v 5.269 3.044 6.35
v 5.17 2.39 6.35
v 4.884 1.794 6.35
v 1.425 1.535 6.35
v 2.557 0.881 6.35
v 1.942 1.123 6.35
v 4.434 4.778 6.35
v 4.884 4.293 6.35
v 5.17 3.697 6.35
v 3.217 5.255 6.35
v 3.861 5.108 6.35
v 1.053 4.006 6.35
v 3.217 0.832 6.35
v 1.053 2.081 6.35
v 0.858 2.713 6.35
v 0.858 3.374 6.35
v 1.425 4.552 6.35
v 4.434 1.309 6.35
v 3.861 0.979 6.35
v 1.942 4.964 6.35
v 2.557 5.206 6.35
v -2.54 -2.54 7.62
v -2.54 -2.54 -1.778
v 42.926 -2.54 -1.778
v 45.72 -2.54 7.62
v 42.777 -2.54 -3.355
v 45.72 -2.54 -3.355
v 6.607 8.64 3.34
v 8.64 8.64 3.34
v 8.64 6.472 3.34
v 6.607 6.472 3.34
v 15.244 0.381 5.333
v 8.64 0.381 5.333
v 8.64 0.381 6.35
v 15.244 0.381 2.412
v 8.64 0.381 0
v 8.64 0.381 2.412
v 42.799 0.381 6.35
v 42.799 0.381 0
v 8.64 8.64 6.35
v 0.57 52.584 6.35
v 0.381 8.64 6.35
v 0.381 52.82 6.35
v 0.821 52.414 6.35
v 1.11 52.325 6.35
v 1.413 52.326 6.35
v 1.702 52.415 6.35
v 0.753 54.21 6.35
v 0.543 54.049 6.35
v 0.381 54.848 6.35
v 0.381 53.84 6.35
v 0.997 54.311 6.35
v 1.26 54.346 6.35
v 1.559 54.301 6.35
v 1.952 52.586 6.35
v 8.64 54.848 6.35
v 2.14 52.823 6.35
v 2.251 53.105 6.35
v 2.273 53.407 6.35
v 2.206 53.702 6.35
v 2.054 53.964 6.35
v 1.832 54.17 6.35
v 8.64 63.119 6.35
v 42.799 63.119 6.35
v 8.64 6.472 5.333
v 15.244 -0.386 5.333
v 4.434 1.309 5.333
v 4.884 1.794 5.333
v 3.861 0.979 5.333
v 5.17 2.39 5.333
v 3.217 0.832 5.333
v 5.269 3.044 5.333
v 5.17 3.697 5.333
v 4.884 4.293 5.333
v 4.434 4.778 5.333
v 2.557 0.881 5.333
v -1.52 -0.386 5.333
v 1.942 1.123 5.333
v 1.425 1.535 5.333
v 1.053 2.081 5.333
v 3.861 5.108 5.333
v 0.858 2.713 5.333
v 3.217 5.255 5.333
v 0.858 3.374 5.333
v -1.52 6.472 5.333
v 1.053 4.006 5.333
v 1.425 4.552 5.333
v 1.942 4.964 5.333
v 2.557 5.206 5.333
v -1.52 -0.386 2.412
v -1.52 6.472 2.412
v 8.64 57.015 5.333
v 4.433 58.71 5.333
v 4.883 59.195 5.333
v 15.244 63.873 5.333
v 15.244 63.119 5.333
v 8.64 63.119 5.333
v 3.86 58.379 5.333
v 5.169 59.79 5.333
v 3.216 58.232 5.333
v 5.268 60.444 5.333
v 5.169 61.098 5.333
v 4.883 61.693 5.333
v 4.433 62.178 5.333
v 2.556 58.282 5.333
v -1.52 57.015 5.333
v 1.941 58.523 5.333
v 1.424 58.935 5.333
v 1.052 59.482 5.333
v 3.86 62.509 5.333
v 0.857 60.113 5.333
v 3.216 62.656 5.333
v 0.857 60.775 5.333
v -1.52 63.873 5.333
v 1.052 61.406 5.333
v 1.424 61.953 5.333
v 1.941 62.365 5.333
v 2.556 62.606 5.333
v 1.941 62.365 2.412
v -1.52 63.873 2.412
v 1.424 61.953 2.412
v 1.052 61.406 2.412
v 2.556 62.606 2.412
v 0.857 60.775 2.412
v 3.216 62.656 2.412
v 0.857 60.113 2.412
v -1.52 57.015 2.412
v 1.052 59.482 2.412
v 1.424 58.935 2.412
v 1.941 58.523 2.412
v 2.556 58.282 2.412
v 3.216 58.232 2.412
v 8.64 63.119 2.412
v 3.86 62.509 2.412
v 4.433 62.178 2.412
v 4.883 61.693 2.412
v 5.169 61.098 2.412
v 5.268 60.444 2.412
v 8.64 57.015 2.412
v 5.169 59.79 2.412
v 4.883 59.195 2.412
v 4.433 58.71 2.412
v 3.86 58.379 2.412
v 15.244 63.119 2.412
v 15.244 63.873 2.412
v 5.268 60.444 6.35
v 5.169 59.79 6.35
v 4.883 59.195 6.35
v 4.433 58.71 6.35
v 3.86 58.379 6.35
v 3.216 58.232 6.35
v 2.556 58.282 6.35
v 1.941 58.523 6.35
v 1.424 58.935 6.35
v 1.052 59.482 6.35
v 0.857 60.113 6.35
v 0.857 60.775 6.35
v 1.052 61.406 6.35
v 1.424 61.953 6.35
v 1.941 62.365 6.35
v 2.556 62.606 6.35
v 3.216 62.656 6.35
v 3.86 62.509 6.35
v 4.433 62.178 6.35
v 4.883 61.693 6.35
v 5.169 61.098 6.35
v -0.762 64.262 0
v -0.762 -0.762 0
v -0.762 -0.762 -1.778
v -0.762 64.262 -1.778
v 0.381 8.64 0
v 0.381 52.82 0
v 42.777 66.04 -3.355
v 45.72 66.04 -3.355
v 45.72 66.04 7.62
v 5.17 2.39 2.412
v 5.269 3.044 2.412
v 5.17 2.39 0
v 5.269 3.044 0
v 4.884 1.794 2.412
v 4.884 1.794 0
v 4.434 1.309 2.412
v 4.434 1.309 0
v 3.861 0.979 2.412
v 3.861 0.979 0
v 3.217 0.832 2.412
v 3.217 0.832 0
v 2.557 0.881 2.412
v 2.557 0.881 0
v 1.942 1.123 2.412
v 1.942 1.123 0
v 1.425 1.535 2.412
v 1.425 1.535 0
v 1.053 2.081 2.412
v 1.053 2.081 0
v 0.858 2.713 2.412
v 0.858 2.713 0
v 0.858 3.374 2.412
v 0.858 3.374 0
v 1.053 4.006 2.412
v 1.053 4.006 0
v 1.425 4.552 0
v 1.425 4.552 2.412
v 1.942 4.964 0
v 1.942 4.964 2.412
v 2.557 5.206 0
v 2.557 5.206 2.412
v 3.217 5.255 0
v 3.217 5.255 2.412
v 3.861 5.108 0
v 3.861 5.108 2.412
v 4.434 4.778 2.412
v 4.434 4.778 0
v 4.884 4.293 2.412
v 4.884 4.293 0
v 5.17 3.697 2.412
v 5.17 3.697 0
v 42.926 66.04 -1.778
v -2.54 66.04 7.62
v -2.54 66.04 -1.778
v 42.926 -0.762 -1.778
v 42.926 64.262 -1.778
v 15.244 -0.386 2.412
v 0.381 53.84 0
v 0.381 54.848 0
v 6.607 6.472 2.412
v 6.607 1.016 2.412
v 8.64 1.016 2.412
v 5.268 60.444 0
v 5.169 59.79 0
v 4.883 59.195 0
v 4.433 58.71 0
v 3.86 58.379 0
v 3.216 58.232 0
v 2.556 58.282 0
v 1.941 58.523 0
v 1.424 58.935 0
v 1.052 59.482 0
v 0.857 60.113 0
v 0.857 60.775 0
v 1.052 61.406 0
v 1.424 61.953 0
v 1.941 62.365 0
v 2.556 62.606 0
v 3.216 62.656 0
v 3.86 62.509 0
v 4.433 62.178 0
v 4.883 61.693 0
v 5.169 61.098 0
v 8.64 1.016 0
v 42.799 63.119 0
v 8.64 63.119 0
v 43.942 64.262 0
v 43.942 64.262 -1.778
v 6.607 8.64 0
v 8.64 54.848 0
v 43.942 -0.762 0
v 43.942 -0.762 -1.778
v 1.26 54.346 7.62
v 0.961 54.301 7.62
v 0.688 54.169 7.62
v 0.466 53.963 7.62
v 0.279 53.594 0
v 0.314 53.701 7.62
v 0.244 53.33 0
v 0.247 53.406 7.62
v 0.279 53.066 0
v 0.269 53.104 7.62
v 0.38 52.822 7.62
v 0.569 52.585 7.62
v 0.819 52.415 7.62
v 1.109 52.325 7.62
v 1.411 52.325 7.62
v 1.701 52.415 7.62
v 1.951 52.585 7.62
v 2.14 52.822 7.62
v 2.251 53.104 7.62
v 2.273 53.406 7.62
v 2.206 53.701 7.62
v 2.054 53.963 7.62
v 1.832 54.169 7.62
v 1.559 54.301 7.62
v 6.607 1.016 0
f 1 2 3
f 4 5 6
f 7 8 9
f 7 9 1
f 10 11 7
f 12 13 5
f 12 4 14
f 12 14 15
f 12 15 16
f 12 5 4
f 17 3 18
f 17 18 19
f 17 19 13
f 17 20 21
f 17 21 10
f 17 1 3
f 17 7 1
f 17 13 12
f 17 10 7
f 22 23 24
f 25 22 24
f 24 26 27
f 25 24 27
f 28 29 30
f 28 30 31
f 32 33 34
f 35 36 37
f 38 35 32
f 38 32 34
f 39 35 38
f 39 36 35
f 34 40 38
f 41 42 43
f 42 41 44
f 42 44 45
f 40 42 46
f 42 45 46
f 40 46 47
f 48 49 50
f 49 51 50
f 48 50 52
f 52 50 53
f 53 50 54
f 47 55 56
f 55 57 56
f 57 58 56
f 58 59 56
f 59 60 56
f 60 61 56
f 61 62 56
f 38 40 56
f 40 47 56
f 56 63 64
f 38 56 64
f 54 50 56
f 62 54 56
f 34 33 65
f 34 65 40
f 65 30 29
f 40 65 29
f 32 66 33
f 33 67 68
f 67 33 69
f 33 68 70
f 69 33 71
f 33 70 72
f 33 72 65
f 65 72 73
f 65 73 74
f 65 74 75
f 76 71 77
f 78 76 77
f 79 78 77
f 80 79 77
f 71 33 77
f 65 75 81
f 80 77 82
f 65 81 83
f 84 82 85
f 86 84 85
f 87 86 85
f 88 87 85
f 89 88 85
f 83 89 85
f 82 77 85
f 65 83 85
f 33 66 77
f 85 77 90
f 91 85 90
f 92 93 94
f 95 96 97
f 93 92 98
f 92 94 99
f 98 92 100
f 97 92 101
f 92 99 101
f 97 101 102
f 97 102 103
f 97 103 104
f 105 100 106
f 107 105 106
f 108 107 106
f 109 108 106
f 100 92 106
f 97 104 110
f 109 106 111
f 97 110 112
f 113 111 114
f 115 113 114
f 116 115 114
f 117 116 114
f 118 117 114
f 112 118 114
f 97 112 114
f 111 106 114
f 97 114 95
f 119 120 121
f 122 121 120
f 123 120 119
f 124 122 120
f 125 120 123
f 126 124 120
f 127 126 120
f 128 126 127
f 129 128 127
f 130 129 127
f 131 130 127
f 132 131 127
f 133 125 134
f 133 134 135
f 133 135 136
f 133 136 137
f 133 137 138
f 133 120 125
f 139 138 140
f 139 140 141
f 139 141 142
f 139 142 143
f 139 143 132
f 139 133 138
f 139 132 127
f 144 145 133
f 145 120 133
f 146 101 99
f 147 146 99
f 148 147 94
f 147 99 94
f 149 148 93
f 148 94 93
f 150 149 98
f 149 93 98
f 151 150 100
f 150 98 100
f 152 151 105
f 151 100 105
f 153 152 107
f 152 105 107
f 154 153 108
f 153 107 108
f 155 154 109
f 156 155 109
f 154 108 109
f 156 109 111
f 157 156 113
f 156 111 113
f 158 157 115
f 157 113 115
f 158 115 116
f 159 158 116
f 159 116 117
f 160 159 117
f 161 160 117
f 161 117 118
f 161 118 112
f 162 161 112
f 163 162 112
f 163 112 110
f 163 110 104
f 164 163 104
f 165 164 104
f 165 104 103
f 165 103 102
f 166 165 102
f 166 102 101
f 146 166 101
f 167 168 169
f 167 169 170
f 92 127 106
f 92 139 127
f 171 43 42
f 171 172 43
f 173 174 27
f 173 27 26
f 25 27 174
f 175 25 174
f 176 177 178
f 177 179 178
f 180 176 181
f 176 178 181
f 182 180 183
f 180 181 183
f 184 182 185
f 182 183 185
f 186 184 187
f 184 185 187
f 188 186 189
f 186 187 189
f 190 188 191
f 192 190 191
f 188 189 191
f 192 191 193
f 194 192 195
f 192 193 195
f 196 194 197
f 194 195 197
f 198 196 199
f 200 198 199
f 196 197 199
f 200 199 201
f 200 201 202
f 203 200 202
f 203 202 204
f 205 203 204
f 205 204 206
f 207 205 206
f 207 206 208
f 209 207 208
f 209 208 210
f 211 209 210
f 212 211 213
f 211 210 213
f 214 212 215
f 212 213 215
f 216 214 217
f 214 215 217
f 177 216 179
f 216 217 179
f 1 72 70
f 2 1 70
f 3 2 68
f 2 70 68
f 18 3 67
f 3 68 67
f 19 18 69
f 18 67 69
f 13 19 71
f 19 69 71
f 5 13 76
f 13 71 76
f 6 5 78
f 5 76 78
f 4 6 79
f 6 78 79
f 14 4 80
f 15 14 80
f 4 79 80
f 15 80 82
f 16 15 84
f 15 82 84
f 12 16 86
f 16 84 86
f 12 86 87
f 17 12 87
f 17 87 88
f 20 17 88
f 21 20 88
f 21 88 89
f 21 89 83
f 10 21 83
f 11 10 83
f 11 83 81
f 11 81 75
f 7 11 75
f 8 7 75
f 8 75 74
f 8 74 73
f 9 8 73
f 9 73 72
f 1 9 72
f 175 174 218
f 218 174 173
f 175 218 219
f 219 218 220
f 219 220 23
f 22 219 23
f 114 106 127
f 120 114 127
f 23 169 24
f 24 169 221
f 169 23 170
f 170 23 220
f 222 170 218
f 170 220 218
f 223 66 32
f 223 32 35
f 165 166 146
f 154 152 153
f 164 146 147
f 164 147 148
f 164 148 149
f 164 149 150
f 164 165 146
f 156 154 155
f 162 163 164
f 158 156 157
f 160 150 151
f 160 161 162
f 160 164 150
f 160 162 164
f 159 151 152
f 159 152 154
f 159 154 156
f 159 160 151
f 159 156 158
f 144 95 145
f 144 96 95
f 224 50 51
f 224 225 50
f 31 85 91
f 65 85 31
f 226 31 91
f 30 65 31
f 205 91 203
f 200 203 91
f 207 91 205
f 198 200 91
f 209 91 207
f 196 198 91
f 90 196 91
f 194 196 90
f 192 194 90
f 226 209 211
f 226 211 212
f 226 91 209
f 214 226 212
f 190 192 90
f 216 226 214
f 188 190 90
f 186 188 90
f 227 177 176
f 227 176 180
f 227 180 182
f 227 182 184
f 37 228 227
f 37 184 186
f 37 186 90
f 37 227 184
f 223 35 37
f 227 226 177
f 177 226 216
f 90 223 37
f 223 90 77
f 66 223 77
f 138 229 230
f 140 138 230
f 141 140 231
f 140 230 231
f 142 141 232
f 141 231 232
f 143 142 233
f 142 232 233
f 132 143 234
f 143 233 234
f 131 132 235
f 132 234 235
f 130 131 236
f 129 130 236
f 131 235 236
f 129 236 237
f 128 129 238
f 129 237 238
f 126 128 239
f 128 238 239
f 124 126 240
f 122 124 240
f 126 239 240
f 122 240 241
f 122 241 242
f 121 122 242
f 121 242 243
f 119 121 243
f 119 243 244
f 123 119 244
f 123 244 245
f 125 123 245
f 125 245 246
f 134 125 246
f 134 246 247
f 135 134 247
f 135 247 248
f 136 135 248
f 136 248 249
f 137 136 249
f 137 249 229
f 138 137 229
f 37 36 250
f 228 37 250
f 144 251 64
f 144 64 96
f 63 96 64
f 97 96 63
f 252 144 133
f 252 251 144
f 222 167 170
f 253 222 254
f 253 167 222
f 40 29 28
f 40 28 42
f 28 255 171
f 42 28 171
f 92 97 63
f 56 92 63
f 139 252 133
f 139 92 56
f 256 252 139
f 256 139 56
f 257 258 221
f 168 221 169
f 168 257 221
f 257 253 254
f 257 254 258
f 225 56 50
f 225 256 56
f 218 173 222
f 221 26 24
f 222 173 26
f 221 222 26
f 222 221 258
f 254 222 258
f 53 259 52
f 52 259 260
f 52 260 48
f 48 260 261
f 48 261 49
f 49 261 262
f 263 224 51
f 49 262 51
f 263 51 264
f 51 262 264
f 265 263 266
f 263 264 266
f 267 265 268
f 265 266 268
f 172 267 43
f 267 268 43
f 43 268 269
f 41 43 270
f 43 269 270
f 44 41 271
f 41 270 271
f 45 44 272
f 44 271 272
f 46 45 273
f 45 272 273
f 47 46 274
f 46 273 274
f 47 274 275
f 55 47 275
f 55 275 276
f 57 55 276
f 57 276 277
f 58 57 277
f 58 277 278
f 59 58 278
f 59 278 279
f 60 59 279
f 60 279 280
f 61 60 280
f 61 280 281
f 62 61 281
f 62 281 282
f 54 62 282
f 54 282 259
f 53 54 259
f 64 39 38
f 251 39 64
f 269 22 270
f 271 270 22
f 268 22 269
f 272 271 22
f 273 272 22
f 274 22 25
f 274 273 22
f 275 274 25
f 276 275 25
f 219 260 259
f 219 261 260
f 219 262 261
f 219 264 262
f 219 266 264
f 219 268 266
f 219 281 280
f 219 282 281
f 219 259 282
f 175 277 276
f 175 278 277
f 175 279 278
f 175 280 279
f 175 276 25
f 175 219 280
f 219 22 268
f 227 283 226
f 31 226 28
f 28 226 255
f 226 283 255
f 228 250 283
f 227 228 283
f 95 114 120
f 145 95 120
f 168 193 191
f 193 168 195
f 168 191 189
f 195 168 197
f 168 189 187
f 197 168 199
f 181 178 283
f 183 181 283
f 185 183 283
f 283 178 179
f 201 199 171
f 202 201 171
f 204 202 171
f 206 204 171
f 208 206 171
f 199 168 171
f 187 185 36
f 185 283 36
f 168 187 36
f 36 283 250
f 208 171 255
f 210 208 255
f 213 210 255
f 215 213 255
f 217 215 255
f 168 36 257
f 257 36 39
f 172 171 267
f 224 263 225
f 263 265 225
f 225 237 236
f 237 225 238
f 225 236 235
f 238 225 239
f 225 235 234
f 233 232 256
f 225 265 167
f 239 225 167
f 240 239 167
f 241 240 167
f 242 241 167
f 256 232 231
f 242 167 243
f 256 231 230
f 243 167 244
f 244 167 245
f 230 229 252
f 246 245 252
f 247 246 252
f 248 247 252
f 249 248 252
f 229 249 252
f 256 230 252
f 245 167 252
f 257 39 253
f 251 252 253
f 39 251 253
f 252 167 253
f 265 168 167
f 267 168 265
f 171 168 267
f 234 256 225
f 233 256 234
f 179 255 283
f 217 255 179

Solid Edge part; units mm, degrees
sketch "Sketch1" plane through (0, 0, 0) normal (0, 0, 1) x (1, 0, 0)
  line L0 (45.72, -2.54) -> (45.72, 66.04)
  line L1 (45.72, 66.04) -> (-2.54, 66.04)
  line L2 (-2.54, 66.04) -> (-2.54, -2.54)
  line L3 (-2.54, -2.54) -> (45.72, -2.54)
  line L4 (42.799, 0.381) -> (42.799, 63.119)
  line L5 (42.799, 63.119) -> (0.381, 63.119)
  line L6 (0.381, 63.119) -> (0.381, 0.381)
  line L7 (0.381, 0.381) -> (42.799, 0.381)
  dimension "D1" = 2.54
  dimension "D2" = 0.381
extrude "Protrusion1" add sketch "Sketch1" along normal blind 6.35
sketch "Sketch2" plane through (21.59, 31.75, 0) normal (0, 0, -1) x (0, 1, 0)
  line L0 (32.512, -22.352) -> (32.512, 22.352)
  line L1 (32.512, 22.352) -> (-32.512, 22.352)
  line L2 (-32.512, 22.352) -> (-32.512, -22.352)
  line L3 (-32.512, -22.352) -> (32.512, -22.352)
  line L4 (34.29, 24.13) -> (34.29, -24.13)
  line L5 (34.29, -24.13) -> (-34.29, -24.13)
  line L6 (-34.29, -24.13) -> (-34.29, 24.13)
  line L7 (-34.29, 24.13) -> (34.29, 24.13)
  dimension "D1" = 0.762
extrude "Protrusion2" add sketch "Sketch2" along normal up to vertex (1.778 mm away)
sketch "Sketch3" plane through (21.59, -2.54, 2.286) normal (0, -1, 0) x (-1, 0, 0)
  line L0 (-24.13, 5.6414) -> (-21.187, 5.6414)
  line L1 (-21.187, 5.6414) -> (-21.336, 4.064)
  line L2 (-21.336, 4.064) -> (-24.13, 4.064)
  line L3 (-24.13, 4.064) -> (-24.13, 5.6414)
extrude "Protrusion3" add sketch "Sketch3" against normal up to vertex (68.58 mm away)
sketch "Sketch4" plane through (21.59, 31.75, 6.35) normal (0, 0, 1) x (0, -1, 0)
  line L0 (34.29, 24.13) -> (-34.29, 24.13)
  line L1 (-34.29, 24.13) -> (-34.29, -24.13)
  line L2 (-34.29, -24.13) -> (34.29, -24.13)
  line L3 (34.29, -24.13) -> (34.29, 24.13)
extrude "ExtrudedProtrusion_4" add sketch "Sketch4" along normal blind 1.27
sketch "Sketch5" plane through (21.59, 31.75, 0) normal (0, 0, -1) x (-1, 0, 0)
  line L0 (12.95, -23.11) -> (24.13, -23.11)
  line L1 (24.13, -23.11) -> (24.13, -34.29)
  line L2 (24.13, -34.29) -> (12.95, -34.29)
  line L3 (12.95, -34.29) -> (12.95, -23.11)
  line L4 (12.95, 34.29) -> (12.95, 23.098)
  line L5 (12.95, 23.098) -> (24.13, 23.098)
  line L6 (24.13, 23.098) -> (24.13, 34.29)
  line L7 (24.13, 34.29) -> (12.95, 34.29)
extrude "Protrusion4" add sketch "Sketch5" against normal up to vertex (7.62 mm away)
sketch "Sketch6" plane through (21.59, 31.75, 0) normal (0, 0, -1) x (1, 0, 0)
  circle A0 centre (-18.54, -28.694) radius 2.2179
  circle A1 centre (-18.539, 28.7065) radius 2.2179
  dimension "D1" = 4.4359
extrude "Cutout1" cut sketch "Sketch6" against normal up to vertex (6.35 mm away)
sketch "Sketch7" plane through (8.64, 4.0083, 3.175) normal (1, 0, 0) x (0, 0, 1)
  line L0 (2.1584, -2.4641) -> (-0.7626, -2.4641)
  line L1 (-0.7626, -2.4641) -> (-0.7626, 4.3939)
  line L2 (-0.7626, 4.3939) -> (2.1584, 4.3939)
  line L3 (2.1584, 4.3939) -> (2.1584, -2.4641)
  line L4 (-0.7626, -53.0066) -> (2.1584, -53.0066)
  line L5 (2.1584, -53.0066) -> (2.1584, -59.8646)
  line L6 (2.1584, -59.8646) -> (-0.7626, -59.8646)
  line L7 (-0.7626, -59.8646) -> (-0.7626, -53.0066)
  dimension "D1" = 6.858
  dimension "D2" = 2.921
  dimension "D3" = 3.048
extrude "ExtrudedCutout_2" cut sketch "Sketch7" along normal blind 6.604
sketch "Sketch8" plane through (8.64, 4.0083, 3.175) normal (1, 0, 0) x (0, 0, 1)
  line L0 (2.1584, -2.4641) -> (-0.7626, -2.4641)
  line L1 (-0.7626, -2.4641) -> (-0.7626, 4.3939)
  line L2 (-0.7626, 4.3939) -> (2.1584, 4.3939)
  line L3 (2.1584, 4.3939) -> (2.1584, -2.4641)
  line L4 (-0.7626, -59.8646) -> (-0.7626, -53.0066)
  line L5 (-0.7626, -53.0066) -> (2.1584, -53.0066)
  line L6 (2.1584, -53.0066) -> (2.1584, -59.8646)
  line L7 (2.1584, -59.8646) -> (-0.7626, -59.8646)
  dimension "D1" = 6.858
  dimension "D2" = 2.921
  dimension "D3" = 3.048
extrude "ExtrudedCutout_3" cut sketch "Sketch8" against normal blind 10.16
sketch "Sketch9" plane through (21.59, 31.75, 7.62) normal (0, 0, 1) x (0, 1, 0)
  circle A0 centre (21.58, 20.33) radius 1.016
extrude "Cutout2" cut sketch "Sketch9" against normal through all
sketch "Sketch10" plane through (21.59, 31.75, 0) normal (0, 0, -1) x (0, 1, 0)
  line L0 (-30.734, -14.9831) -> (-23.11, -14.9831)
  line L1 (-23.11, -14.9831) -> (-23.11, -12.95)
  line L2 (-23.11, -12.95) -> (-30.734, -12.95)
  line L3 (-30.734, -12.95) -> (-30.734, -14.9831)
extrude "ExtrudedCutout_6" cut sketch "Sketch10" against normal blind 3.34
